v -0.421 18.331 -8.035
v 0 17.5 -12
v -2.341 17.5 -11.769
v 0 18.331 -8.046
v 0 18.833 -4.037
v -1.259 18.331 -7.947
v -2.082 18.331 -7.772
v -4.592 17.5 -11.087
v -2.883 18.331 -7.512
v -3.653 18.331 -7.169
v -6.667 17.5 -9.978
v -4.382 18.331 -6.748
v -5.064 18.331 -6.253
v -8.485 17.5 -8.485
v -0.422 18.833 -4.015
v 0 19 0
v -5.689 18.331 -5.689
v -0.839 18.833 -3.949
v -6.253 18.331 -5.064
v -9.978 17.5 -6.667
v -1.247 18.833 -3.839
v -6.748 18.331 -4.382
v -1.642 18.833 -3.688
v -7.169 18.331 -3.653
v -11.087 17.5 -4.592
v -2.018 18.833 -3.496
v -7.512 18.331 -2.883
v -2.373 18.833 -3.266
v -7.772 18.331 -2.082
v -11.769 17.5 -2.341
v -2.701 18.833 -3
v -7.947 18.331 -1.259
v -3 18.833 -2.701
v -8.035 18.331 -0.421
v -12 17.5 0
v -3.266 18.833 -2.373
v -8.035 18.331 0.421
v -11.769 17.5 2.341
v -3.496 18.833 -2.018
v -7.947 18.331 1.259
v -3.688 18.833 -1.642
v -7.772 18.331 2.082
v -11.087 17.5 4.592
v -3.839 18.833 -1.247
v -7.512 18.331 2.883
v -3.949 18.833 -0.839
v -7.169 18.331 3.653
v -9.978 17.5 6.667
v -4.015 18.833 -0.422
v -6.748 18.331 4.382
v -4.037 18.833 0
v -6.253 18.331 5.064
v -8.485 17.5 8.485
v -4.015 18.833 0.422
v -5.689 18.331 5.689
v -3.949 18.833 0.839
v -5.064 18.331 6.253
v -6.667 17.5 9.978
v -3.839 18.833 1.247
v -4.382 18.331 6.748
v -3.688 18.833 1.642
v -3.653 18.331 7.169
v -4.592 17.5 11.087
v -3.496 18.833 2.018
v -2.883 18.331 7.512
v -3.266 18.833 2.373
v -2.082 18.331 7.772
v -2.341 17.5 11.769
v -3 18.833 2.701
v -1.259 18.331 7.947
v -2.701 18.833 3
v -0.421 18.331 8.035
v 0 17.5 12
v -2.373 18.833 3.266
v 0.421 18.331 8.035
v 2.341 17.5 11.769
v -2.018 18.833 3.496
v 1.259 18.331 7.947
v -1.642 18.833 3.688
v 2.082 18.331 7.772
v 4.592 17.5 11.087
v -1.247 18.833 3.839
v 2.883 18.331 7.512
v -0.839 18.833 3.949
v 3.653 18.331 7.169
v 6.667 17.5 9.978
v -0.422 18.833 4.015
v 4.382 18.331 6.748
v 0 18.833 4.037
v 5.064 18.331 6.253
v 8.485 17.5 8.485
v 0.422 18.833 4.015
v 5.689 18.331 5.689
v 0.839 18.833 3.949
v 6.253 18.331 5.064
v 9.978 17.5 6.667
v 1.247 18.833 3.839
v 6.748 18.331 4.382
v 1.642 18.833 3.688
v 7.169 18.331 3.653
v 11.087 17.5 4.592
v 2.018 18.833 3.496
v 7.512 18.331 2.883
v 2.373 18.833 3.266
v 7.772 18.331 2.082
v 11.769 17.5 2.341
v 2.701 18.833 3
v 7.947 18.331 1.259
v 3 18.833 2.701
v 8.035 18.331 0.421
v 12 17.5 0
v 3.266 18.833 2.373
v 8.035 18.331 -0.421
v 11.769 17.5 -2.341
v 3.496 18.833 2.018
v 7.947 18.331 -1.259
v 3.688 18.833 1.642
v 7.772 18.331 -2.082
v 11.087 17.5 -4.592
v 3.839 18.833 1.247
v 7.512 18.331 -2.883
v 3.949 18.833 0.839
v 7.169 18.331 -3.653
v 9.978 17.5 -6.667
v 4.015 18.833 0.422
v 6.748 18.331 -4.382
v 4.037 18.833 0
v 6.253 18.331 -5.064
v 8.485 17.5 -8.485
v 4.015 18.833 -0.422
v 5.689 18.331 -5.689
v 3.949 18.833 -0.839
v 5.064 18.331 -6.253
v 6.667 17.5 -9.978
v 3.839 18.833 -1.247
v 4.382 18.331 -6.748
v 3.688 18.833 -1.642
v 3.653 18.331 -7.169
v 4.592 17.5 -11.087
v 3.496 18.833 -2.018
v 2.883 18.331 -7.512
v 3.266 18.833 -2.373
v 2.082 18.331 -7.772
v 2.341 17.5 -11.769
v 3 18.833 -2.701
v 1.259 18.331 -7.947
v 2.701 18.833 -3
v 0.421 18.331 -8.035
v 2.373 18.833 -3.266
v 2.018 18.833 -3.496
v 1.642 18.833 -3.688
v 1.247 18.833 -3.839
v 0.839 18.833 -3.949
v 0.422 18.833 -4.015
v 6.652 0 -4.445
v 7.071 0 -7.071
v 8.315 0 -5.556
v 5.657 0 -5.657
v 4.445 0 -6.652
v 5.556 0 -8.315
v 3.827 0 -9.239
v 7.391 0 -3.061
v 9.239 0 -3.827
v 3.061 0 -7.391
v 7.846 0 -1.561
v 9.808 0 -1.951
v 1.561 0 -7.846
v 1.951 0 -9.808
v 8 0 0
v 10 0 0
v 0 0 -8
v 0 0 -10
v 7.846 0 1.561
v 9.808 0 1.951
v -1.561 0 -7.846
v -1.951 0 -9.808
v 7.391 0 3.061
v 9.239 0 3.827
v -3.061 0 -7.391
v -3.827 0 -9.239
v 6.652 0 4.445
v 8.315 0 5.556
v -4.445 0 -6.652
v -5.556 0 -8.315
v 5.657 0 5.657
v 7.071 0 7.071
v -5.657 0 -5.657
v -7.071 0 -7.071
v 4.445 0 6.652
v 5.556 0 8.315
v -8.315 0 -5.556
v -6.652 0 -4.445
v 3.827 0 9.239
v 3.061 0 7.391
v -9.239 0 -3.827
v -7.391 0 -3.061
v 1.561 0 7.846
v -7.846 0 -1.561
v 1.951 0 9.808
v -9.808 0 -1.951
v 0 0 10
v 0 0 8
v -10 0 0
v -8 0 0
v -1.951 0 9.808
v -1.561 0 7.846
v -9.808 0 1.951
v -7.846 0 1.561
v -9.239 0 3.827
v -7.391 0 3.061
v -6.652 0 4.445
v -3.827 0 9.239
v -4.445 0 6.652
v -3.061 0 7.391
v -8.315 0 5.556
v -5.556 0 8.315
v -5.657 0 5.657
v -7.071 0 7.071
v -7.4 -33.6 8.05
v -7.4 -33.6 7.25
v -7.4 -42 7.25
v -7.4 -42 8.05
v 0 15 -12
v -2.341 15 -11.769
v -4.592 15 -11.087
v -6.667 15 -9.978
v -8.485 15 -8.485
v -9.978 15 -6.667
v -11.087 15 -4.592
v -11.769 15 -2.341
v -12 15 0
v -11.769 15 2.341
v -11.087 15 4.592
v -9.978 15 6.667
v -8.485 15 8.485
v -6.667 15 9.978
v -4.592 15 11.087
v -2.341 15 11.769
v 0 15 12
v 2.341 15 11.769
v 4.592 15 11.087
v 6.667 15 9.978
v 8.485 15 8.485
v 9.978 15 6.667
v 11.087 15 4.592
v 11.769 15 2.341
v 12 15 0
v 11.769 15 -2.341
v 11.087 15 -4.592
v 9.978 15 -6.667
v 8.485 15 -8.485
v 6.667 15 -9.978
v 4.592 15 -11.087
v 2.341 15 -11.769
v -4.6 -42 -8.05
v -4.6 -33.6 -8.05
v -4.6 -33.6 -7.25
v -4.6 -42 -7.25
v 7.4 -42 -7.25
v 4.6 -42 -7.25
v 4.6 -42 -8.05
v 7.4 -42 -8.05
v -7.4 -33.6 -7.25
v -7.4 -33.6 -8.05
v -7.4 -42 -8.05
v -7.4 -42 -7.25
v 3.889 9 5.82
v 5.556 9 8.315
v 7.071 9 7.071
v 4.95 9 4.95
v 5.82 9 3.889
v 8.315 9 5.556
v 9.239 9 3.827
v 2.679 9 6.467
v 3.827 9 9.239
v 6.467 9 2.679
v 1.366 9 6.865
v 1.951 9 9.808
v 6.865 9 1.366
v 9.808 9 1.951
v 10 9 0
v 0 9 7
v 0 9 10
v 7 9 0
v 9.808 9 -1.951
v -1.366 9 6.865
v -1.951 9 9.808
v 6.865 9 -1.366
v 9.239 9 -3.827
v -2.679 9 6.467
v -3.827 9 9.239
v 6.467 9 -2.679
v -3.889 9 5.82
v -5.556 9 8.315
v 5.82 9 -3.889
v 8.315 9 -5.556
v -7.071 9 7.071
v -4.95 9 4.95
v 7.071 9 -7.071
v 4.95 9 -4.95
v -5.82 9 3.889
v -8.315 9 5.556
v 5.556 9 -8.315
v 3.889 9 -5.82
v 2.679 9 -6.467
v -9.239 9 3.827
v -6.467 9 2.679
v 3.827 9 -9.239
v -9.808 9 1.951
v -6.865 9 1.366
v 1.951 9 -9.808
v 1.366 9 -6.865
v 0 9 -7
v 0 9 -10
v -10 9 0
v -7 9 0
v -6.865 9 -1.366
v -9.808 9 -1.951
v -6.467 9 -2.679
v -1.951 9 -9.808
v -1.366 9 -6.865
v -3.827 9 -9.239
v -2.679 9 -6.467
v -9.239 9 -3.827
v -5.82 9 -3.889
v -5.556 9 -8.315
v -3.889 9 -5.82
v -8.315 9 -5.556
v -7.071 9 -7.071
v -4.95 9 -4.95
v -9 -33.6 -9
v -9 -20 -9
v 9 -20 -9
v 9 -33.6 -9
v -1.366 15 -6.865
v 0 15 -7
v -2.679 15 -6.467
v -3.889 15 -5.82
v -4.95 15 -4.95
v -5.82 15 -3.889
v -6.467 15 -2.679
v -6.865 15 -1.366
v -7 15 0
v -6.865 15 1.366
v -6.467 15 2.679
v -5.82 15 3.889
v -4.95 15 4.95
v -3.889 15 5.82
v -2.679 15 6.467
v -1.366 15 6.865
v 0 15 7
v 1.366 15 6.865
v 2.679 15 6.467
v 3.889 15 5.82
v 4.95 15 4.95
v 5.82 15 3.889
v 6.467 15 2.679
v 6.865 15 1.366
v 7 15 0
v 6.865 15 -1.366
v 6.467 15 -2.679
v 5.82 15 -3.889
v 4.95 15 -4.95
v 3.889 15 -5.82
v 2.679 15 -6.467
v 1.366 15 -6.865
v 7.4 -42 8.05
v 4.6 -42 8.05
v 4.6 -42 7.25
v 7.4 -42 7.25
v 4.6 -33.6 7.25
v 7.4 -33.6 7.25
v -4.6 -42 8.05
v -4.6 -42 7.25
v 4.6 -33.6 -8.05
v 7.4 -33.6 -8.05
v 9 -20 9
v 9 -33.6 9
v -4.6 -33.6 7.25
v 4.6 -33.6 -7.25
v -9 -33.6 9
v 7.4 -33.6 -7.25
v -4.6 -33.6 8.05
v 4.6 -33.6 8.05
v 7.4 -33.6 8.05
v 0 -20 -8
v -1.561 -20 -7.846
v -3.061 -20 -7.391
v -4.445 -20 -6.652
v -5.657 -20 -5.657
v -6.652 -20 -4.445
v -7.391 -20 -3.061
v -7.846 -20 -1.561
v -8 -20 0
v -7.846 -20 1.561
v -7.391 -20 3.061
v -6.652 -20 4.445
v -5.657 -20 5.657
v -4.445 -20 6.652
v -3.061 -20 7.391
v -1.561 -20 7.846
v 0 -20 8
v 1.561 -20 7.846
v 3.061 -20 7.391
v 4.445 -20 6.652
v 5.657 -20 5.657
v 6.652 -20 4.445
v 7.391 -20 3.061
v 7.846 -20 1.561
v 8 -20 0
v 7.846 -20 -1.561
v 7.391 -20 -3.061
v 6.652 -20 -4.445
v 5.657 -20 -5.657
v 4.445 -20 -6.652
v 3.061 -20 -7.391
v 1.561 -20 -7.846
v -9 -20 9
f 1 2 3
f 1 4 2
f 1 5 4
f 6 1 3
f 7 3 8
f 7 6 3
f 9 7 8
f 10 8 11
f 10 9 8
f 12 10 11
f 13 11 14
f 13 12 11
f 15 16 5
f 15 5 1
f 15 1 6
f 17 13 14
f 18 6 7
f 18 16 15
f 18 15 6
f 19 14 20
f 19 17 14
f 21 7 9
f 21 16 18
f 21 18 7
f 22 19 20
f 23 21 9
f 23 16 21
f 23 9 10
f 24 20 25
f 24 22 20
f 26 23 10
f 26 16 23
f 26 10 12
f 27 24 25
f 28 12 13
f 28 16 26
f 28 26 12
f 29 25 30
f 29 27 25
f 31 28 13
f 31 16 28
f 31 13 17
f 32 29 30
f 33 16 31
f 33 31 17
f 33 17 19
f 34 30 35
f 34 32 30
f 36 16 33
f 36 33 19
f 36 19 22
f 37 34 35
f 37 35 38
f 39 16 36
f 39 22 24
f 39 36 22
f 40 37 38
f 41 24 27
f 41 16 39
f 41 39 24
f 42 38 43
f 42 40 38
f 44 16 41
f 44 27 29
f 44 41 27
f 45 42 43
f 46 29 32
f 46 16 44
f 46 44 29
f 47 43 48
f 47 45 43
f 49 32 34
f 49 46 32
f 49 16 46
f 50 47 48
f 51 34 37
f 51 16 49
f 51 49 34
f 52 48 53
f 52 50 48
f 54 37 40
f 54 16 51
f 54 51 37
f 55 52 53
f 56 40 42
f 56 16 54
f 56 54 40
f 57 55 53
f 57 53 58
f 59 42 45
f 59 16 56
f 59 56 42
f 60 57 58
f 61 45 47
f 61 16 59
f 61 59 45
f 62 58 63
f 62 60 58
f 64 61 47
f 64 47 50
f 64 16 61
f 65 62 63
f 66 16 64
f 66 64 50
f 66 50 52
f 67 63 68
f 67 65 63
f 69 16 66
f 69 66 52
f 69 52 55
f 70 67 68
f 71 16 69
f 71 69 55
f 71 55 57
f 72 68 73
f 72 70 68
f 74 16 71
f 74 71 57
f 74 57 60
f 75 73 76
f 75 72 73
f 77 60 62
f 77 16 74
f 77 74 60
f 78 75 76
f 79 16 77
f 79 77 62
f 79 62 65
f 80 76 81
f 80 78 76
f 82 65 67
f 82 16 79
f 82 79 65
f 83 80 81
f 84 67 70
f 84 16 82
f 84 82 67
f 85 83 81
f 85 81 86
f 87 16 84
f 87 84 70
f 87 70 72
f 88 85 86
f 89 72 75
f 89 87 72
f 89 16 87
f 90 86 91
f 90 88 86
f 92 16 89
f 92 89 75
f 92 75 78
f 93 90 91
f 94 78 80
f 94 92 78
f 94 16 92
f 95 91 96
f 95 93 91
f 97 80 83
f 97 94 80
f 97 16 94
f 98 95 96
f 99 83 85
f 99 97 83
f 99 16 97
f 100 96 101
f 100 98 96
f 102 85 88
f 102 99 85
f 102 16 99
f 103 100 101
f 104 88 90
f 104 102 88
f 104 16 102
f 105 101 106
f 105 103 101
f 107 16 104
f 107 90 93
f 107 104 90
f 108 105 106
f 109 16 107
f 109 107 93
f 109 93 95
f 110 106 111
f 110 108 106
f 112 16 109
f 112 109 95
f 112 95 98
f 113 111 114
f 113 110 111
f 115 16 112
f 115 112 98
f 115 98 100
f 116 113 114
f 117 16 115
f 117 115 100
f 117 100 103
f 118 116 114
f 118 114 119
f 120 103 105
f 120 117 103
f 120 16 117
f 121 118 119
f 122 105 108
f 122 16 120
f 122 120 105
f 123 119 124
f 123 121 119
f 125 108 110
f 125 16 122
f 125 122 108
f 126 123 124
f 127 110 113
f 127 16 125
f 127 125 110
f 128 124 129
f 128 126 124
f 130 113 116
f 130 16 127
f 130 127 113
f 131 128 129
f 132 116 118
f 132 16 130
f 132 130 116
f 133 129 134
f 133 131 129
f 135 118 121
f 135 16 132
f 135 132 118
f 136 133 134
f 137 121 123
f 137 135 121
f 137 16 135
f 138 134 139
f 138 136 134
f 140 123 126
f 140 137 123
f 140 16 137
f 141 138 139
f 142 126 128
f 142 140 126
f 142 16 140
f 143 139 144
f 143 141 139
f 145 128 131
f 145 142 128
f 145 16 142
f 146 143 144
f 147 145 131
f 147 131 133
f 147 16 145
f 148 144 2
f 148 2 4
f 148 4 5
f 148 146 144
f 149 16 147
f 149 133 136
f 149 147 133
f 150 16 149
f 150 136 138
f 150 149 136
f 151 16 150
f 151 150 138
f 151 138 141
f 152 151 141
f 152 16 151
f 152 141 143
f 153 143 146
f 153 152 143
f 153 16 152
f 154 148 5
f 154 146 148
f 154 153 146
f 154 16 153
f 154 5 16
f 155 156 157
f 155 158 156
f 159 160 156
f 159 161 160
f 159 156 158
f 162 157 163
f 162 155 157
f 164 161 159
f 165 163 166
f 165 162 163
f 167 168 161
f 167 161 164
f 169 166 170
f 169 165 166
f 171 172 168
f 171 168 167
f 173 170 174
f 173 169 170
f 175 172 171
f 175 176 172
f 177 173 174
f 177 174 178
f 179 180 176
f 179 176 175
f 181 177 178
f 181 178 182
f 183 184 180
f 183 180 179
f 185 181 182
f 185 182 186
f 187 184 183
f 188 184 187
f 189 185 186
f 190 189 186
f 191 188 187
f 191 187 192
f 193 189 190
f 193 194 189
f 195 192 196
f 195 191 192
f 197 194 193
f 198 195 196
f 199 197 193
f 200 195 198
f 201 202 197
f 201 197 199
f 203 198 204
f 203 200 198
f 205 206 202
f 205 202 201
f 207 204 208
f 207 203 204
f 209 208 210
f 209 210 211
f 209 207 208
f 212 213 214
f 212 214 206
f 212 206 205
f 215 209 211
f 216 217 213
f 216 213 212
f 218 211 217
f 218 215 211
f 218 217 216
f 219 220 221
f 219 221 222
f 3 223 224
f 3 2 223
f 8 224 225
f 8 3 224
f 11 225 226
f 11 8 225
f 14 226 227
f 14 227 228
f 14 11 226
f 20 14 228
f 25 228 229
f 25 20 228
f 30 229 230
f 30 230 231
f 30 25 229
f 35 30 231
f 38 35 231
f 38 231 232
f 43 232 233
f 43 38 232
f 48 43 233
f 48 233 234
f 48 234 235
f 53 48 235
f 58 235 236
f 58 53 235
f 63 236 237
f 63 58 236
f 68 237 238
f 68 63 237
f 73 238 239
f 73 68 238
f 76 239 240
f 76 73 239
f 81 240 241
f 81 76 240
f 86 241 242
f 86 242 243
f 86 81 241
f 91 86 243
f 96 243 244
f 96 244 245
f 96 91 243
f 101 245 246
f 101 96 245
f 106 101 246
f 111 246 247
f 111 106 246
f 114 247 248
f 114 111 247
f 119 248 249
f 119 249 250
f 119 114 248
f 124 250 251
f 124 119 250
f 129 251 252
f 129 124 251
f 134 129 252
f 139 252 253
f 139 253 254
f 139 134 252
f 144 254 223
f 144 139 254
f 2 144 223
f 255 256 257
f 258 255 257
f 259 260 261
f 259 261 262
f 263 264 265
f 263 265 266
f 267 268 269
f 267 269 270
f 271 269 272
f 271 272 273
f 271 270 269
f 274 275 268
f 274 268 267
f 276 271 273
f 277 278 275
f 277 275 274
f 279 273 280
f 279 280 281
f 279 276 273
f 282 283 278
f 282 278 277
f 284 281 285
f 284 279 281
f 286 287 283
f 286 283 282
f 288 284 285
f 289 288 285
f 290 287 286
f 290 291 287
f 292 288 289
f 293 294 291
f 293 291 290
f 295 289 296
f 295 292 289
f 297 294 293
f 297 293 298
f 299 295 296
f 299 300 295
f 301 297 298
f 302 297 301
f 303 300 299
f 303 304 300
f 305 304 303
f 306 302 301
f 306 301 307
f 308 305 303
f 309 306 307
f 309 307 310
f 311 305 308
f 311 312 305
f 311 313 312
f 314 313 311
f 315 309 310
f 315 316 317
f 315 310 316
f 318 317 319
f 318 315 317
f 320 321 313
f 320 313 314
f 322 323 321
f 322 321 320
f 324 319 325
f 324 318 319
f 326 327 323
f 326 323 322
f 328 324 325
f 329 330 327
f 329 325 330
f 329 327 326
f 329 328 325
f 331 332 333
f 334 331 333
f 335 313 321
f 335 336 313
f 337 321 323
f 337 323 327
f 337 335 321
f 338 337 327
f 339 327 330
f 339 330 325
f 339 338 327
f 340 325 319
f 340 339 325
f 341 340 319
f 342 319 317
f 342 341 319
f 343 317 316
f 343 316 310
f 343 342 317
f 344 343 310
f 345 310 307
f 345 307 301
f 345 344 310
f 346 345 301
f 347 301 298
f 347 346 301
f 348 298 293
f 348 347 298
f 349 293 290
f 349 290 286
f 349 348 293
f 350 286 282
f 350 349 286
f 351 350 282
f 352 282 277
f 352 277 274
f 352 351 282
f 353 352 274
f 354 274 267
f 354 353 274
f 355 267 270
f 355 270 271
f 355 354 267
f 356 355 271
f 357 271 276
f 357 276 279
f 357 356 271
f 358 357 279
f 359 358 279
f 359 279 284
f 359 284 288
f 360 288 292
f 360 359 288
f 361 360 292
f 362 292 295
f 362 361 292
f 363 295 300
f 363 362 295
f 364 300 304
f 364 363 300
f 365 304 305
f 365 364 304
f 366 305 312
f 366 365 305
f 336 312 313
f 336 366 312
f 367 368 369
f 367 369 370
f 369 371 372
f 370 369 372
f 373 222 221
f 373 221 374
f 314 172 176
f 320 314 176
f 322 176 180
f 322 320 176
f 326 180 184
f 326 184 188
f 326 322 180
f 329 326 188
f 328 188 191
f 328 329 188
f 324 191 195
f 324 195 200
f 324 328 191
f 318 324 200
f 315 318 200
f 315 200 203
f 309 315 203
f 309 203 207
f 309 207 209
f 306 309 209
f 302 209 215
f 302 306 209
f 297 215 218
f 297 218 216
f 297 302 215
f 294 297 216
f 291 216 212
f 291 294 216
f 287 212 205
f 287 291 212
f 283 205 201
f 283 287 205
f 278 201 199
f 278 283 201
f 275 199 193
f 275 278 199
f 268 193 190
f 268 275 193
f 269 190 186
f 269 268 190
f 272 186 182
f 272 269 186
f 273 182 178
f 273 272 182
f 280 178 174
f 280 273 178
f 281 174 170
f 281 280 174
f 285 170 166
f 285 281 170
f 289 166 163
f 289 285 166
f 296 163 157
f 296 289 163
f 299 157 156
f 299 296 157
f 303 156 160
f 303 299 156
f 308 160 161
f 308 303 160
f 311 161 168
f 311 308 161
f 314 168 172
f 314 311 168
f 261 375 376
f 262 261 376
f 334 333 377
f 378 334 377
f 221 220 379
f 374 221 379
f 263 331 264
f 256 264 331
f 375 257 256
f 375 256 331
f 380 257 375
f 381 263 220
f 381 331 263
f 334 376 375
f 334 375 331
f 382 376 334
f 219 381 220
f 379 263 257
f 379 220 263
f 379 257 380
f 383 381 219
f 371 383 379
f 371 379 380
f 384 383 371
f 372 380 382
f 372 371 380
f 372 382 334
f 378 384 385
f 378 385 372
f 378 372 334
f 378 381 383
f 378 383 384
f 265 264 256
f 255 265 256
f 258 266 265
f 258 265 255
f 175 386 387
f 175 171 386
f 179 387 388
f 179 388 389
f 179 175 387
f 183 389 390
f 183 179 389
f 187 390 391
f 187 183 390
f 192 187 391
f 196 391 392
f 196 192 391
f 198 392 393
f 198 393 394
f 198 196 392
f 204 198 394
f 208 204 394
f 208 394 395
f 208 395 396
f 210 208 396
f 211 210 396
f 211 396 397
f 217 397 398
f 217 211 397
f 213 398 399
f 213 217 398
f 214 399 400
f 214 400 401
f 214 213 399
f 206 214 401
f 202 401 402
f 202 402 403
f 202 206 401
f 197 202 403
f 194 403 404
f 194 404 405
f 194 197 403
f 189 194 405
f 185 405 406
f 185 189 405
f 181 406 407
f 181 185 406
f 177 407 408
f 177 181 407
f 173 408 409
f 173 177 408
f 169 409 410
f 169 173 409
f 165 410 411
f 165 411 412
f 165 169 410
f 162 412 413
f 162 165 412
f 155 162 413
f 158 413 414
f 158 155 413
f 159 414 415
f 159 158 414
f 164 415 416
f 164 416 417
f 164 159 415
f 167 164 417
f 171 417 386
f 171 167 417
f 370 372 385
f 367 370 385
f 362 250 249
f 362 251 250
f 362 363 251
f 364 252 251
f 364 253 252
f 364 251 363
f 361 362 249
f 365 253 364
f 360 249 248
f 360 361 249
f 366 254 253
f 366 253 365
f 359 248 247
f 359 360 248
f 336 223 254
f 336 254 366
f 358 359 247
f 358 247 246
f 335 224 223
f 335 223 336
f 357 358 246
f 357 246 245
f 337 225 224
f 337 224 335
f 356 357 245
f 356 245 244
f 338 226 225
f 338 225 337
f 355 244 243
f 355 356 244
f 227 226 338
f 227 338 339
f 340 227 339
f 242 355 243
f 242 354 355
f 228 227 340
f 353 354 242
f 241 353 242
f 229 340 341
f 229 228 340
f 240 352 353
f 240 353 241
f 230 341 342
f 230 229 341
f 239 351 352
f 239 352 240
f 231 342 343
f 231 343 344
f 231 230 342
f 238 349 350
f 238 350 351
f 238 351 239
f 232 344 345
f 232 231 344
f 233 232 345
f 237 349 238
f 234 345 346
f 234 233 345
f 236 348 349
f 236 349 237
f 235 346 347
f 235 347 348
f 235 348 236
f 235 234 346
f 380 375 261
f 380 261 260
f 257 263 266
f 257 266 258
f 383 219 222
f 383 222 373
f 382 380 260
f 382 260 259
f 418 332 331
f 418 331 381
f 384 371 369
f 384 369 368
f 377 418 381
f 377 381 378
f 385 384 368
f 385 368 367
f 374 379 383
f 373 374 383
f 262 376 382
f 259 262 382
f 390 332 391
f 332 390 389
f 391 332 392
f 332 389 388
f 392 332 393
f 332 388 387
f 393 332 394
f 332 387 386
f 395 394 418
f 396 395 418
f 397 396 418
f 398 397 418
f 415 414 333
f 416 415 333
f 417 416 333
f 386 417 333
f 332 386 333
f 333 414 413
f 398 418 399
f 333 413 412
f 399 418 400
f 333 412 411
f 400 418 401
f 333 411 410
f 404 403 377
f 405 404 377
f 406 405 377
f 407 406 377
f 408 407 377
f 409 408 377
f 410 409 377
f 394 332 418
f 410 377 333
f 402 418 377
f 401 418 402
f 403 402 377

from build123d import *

# Parameters (mm, degrees)
ESQUISSE2_W        = 18
ESQUISSE2_H        = 18
BOSS_EXTRU_1_DEPTH = 13.6
ESQUISSE3_W        = 2.8
ESQUISSE3_H        = 0.8
BOSS_EXTRU_2_DEPTH = 8.4


with BuildPart() as part:
    # Esquisse1 → Révolution1 (revolve)
    with BuildSketch(Plane.XY, mode=Mode.PRIVATE) as r_volution1_sk:
        with BuildLine():
            Line((0, 19), (0, 0))
            Line((0, 0), (0, -20))
            Line((0, -20), (8, -20))
            Line((8, -20), (8, 0))
            Line((8, 0), (10, 0))
            Line((10, 0), (10, 9))
            Line((10, 9), (7, 9))
            Line((7, 9), (7, 15))
            Line((7, 15), (12, 15))
            Line((12, 15), (12, 17.5))
            ThreePointArc((12, 17.5), (6.046693311, 18.62354649), (0, 19))
        make_face()
    revolve(r_volution1_sk.sketch.rotate(Axis((0, 19, 0), (0, 1, 0)), 90), axis=Axis((0, 19, 0), (0, 1, 0)))

    # Esquisse2 → Boss.-Extru.1 (add)
    with BuildSketch(Plane.XZ.offset(20)):
        Rectangle(ESQUISSE2_W, ESQUISSE2_H)
    extrude(amount=BOSS_EXTRU_1_DEPTH)

    # Esquisse3 → Boss.-Extru.2 (add)
    with BuildSketch(Plane.XZ.offset(33.6)):
        with Locations((-6, 7.65)):
            Rectangle(ESQUISSE3_W, ESQUISSE3_H)
        with Locations((6, 7.65)):
            Rectangle(ESQUISSE3_W, ESQUISSE3_H)
        with Locations((6, -7.65)):
            Rectangle(ESQUISSE3_W, ESQUISSE3_H)
        with Locations((-6, -7.65)):
            Rectangle(ESQUISSE3_W, ESQUISSE3_H)
    extrude(amount=BOSS_EXTRU_2_DEPTH)


solid = part.part
